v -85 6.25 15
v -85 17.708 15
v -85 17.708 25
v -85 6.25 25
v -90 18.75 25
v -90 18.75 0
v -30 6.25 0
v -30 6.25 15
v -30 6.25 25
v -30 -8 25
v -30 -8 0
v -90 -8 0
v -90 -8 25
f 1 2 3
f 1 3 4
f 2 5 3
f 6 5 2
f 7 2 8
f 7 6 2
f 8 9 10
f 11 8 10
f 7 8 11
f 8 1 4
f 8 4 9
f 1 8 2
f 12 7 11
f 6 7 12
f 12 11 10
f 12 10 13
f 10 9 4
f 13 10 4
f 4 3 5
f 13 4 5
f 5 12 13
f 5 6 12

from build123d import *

# Parameters (mm, degrees)
F1_DEPTH = 15
F3_DEPTH = 10
F4_DEPTH = 3
F5_DEPTH = 5


with BuildPart() as f1:
    # F0 (on Top) → F1 (new body)
    with BuildSketch(Plane.XY):
        Polygon((30, 6.25), (30, 0), (60, 0), (60, 12.5), align=None)
        Polygon((60, 12.5), (60, 0), (90, 0), (90, 18.75), align=None)
    extrude(amount=F1_DEPTH)

    # F2 (on face) → F3 (join)
    with BuildSketch(Plane.XY.offset(15)):
        Polygon((30, 0), (90, 0), (90, 18.75), (85.0000008941, 17.7083335196), (85.0000008941, 6.25), (30, 6.25), align=None)
    extrude(amount=F3_DEPTH)

    # F4 (add): a face of the model
    f4_faces = [f1.faces().sort_by_distance(p)[0] for p in [
        (60, 0, 12.5),
    ]]
    extrude(f4_faces, amount=F4_DEPTH)

    # F5 (add): a face of the model
    f5_faces = [f1.faces().sort_by_distance(p)[0] for p in [
        (60, -3, 12.5),
    ]]
    extrude(f5_faces, amount=F5_DEPTH)


with BuildPart() as f6_1:
    # F6: instance of F1
    add(f1.part.mirror(Plane.YZ))


solid = f6_1.part
